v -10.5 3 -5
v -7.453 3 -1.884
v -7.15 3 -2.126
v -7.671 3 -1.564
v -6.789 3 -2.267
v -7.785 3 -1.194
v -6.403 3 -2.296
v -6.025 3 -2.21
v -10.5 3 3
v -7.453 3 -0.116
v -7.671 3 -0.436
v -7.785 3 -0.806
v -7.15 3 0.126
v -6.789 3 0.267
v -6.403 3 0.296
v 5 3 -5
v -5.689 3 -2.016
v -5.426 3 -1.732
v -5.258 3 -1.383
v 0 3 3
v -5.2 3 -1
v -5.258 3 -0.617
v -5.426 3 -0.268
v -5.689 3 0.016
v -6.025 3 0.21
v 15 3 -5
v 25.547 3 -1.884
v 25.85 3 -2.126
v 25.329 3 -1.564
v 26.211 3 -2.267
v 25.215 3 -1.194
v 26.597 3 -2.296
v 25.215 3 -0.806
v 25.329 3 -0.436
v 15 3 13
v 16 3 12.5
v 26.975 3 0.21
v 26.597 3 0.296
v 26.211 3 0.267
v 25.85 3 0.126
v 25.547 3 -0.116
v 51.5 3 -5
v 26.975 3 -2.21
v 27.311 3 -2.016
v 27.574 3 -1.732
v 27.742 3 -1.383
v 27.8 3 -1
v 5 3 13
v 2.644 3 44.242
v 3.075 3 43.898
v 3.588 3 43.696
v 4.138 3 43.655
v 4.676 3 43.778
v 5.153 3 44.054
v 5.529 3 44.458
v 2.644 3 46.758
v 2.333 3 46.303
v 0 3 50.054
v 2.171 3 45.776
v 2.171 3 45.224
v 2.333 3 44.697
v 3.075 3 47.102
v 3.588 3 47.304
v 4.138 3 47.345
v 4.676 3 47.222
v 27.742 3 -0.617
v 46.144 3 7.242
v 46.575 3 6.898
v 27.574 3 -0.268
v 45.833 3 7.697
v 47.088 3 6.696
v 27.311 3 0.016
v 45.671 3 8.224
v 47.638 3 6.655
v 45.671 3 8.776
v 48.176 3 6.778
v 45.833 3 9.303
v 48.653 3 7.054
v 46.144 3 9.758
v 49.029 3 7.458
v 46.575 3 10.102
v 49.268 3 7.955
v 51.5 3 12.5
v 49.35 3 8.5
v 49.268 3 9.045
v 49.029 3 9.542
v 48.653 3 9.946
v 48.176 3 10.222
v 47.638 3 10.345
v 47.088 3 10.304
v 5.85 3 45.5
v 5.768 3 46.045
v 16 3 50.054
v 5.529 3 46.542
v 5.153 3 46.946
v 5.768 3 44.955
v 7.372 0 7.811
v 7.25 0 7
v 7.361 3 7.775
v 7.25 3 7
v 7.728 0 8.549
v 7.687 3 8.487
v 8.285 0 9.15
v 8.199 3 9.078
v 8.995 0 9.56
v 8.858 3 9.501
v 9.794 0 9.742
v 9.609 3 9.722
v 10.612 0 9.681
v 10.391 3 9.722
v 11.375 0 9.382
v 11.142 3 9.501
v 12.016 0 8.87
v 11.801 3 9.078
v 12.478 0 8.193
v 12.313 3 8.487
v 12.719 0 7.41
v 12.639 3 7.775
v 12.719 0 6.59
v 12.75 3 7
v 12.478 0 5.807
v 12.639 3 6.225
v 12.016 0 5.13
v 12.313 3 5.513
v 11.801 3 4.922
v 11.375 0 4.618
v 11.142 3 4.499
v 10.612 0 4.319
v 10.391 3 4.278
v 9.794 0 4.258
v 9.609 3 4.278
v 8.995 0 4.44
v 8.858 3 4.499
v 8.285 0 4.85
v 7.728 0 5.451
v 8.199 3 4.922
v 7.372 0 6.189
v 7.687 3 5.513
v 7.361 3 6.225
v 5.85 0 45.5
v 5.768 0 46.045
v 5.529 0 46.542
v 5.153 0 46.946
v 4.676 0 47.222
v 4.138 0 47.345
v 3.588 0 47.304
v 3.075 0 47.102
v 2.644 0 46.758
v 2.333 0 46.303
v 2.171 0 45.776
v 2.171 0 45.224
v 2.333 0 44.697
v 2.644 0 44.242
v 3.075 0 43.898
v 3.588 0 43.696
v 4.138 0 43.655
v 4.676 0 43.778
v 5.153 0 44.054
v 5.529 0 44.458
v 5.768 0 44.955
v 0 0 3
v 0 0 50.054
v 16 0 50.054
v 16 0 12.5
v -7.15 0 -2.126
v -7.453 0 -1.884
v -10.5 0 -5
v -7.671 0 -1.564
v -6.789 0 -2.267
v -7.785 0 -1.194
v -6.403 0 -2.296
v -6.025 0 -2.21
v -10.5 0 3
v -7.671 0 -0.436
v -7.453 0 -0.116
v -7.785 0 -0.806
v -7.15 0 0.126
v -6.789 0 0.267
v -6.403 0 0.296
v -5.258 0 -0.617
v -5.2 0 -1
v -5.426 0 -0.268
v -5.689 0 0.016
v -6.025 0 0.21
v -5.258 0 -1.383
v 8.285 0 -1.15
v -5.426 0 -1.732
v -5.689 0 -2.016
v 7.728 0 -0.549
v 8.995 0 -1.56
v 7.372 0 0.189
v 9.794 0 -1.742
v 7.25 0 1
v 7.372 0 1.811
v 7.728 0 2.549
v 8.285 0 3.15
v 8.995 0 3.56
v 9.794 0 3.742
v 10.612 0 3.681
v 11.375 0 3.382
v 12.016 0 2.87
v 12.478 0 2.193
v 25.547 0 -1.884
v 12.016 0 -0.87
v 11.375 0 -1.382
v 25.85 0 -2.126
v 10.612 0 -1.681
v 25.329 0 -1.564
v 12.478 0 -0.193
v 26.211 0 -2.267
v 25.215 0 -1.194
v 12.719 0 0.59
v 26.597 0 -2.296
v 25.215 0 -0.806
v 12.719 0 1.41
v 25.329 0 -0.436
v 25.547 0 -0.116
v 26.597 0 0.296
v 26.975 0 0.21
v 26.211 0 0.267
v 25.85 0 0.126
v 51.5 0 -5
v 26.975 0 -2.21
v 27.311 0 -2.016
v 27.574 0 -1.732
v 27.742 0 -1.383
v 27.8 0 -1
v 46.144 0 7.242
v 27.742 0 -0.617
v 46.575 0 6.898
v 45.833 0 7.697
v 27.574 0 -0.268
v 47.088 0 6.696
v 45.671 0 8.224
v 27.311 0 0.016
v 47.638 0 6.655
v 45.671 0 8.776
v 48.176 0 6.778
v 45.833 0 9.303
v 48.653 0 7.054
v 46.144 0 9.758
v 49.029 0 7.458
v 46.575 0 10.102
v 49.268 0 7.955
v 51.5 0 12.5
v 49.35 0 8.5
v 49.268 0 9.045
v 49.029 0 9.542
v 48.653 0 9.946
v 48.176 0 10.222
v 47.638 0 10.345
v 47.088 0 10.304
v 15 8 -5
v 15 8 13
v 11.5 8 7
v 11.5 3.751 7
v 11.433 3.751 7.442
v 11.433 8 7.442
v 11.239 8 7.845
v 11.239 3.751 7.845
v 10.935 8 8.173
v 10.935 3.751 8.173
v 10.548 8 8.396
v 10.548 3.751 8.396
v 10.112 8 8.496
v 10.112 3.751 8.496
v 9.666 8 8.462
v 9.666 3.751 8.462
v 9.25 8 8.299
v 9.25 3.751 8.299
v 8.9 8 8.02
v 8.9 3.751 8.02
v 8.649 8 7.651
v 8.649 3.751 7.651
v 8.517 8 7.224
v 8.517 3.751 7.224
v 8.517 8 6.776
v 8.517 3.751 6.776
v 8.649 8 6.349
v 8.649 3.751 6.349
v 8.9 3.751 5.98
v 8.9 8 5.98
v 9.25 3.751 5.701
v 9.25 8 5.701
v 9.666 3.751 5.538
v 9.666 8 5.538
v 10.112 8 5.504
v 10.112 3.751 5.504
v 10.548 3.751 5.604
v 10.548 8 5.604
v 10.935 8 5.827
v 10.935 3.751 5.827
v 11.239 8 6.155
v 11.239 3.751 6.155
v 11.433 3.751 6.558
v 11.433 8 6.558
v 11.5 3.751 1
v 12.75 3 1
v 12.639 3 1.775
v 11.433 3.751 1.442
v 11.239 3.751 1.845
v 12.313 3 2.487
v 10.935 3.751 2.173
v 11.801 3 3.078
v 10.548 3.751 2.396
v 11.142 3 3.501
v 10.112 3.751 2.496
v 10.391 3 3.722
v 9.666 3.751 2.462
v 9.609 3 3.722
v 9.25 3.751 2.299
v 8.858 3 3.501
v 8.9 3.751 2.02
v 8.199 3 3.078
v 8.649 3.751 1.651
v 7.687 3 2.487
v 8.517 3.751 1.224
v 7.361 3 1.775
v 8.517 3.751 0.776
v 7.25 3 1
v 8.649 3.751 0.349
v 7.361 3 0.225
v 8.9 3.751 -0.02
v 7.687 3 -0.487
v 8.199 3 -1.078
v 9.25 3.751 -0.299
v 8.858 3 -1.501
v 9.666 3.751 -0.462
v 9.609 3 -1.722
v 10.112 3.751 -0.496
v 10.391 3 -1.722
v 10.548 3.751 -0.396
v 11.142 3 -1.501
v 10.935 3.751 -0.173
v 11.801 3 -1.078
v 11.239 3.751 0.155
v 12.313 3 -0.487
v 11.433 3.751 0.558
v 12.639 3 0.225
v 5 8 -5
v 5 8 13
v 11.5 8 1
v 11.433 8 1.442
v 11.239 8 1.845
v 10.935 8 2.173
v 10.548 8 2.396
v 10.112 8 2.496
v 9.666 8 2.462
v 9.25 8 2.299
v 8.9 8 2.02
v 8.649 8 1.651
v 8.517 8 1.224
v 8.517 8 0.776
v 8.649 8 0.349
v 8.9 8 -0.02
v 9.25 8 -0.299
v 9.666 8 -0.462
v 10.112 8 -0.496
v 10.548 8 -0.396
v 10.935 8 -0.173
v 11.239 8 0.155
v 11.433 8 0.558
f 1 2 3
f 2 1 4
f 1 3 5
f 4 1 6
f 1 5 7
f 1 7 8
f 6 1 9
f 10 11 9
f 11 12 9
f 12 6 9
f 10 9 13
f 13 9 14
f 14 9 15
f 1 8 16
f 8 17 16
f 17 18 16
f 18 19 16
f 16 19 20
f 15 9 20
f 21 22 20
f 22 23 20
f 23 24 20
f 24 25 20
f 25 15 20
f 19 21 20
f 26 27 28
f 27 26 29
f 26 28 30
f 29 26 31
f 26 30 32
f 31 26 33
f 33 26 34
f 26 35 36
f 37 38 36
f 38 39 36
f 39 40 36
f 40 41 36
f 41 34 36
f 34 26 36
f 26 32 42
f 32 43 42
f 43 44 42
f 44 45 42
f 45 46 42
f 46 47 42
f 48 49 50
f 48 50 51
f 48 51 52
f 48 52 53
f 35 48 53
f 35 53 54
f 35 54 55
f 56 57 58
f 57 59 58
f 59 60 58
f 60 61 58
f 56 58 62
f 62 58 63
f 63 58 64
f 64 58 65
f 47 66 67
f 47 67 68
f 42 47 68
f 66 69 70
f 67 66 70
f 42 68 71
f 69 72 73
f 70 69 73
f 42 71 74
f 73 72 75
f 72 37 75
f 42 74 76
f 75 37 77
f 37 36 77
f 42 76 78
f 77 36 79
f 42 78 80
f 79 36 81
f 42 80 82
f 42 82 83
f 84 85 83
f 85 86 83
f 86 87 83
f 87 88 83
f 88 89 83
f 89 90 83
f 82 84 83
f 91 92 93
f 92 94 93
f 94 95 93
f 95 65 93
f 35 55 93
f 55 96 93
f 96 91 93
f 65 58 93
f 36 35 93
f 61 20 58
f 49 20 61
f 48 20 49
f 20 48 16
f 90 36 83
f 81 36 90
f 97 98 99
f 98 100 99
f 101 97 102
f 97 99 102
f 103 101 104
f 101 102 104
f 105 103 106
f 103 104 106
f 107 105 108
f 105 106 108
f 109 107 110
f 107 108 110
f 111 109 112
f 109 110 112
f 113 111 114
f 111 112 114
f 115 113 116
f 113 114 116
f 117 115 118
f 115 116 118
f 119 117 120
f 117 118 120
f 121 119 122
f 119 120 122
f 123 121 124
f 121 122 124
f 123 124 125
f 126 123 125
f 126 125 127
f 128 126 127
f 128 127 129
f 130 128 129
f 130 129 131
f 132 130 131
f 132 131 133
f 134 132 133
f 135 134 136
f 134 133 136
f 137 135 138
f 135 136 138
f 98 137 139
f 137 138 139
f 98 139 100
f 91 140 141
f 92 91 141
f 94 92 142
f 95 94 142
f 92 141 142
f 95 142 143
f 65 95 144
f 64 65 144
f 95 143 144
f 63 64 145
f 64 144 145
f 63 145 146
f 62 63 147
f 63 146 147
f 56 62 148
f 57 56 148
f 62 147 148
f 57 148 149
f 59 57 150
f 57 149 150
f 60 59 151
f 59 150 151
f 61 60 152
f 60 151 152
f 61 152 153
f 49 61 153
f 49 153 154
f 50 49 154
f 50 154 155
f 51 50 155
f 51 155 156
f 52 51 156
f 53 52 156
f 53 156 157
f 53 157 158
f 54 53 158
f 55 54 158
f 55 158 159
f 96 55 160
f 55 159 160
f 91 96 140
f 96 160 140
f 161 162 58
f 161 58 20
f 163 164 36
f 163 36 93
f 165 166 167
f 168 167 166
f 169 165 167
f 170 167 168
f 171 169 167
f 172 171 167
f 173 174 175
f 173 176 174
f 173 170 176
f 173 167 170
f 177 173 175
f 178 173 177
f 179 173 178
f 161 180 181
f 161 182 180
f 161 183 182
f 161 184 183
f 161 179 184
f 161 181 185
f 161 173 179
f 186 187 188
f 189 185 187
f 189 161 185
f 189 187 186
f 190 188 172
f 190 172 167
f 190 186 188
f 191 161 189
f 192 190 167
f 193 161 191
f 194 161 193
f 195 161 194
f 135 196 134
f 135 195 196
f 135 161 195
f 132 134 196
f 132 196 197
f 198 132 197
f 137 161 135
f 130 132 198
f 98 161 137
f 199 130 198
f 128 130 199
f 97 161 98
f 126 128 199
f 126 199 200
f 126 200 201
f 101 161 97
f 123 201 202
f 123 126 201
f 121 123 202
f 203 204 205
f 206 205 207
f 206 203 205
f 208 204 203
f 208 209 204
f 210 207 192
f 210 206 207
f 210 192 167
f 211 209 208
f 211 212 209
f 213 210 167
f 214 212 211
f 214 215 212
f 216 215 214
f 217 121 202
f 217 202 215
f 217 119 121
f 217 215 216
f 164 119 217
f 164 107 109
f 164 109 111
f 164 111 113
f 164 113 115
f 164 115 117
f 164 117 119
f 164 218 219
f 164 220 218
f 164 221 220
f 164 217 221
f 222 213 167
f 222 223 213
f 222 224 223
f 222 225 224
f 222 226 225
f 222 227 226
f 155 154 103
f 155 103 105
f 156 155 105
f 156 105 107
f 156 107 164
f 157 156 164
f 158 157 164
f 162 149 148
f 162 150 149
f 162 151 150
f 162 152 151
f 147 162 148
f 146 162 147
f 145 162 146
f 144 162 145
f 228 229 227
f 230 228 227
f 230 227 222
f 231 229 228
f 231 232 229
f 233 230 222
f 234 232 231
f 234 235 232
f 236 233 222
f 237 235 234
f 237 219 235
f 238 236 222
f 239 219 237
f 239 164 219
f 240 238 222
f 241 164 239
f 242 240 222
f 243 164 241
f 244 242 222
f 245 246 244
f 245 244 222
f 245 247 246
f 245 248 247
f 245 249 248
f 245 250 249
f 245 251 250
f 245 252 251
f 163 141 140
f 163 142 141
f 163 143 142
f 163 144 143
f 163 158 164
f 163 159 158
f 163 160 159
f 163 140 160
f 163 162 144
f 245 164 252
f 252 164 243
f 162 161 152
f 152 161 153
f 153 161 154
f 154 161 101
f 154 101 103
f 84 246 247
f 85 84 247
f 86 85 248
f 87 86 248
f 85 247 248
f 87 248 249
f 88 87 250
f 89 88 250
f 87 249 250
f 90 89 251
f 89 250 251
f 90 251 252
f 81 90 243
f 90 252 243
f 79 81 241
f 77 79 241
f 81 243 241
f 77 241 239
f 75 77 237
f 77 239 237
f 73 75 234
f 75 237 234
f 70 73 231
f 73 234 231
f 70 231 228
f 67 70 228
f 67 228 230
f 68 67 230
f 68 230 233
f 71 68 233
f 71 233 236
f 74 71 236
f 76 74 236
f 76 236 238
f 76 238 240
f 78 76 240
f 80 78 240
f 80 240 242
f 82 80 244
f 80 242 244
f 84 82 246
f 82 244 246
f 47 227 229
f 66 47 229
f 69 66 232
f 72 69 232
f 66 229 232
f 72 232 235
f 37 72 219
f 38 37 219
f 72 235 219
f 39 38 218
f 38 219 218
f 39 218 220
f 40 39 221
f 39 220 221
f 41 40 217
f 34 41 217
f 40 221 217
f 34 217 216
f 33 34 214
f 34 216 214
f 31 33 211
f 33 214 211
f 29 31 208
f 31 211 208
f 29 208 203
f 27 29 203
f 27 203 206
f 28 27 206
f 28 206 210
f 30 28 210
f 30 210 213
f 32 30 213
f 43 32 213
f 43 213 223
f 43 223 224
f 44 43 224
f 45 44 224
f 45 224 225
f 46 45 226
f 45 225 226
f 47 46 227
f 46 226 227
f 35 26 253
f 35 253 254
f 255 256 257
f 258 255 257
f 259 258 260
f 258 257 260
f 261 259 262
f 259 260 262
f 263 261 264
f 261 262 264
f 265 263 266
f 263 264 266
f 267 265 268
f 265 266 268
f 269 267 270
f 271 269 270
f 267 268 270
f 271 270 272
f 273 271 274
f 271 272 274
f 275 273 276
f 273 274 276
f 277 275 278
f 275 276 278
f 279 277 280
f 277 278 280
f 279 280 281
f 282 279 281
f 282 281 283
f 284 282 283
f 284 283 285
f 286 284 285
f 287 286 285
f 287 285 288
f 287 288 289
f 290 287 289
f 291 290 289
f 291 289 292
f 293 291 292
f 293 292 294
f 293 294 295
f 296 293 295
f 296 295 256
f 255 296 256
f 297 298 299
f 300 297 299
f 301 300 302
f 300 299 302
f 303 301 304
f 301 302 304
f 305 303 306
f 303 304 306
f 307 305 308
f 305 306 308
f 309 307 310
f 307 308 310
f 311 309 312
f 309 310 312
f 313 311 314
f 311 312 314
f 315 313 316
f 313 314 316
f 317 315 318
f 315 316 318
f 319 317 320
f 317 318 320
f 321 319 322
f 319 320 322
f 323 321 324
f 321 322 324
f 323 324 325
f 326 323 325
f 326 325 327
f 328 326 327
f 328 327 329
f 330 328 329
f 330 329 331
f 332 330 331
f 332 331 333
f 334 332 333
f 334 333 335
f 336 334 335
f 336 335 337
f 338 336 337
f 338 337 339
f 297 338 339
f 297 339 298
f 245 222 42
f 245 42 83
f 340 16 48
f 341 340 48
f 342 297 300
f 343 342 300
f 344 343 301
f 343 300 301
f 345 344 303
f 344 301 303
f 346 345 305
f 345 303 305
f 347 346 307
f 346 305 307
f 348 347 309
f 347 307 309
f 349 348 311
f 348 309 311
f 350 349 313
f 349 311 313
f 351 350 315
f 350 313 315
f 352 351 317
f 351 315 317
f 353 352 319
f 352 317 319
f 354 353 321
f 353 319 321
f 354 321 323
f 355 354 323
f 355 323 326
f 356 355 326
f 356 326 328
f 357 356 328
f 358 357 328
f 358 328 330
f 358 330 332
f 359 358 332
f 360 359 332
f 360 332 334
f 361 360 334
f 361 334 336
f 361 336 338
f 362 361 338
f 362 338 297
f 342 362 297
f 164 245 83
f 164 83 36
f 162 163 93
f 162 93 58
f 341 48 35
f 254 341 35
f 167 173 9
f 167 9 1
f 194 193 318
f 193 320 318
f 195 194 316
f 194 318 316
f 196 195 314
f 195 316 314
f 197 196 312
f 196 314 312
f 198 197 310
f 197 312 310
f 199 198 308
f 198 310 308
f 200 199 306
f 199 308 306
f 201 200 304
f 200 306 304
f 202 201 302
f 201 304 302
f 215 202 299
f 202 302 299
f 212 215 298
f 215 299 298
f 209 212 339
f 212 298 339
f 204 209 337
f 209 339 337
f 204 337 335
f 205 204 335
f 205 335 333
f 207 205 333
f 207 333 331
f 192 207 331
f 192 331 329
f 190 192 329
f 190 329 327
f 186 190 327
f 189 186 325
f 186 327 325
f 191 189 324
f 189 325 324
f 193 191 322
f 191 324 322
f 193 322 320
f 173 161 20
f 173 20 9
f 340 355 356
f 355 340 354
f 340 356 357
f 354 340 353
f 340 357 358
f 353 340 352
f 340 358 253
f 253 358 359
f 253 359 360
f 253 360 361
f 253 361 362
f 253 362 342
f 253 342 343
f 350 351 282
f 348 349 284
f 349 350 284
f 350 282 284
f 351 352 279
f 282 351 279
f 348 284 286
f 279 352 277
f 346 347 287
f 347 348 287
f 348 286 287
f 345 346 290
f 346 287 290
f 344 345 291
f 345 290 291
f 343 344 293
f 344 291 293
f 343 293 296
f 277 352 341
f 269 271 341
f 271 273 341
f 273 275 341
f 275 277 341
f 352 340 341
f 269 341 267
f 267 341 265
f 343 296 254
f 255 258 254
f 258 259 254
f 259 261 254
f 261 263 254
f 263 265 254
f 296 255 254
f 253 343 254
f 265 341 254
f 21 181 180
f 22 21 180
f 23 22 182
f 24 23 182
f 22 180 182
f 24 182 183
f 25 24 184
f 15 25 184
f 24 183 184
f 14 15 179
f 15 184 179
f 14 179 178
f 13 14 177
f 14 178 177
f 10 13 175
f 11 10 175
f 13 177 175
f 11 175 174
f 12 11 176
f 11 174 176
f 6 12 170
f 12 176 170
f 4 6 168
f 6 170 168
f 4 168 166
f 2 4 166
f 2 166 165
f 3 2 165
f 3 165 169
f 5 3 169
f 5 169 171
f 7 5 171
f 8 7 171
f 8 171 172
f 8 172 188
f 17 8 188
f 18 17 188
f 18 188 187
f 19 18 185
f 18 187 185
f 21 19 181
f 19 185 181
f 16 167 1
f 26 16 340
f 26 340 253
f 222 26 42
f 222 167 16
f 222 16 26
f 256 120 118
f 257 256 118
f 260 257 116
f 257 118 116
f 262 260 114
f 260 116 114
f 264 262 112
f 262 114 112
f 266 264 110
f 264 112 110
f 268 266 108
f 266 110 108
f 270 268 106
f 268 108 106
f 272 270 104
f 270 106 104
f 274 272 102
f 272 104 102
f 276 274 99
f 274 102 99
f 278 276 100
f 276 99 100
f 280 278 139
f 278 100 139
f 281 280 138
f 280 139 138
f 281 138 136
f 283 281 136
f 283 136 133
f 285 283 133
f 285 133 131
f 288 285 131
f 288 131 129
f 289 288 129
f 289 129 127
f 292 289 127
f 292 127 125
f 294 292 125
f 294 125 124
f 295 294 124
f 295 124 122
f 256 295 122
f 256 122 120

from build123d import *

# Parameters (mm, degrees)
F0_R     = 1.3
F0_R_2   = 1.85
F0_W     = 10
F0_H     = 18
F0_R_3   = 1.5
F1_DEPTH = 3
F2_DEPTH = 8
F3_D     = 5.5
F3_DEPTH = 3
F3_TIP   = 1.6523667023


with BuildPart() as f1:
    # F0 (on Front) → F1 (new body)
    with BuildSketch(Plane.XZ):
        Polygon((0, 3), (-10.5, 3), (-10.5, -5), (5, -5), (5, 13), (15, 13), (15, -5), (51.5, -5), (51.5, 12.5), (16, 12.5), (16, 50.0543485135), (0, 50.0543485135), align=None)
        with Locations((-6.5, -1)):
            Circle(F0_R, mode=Mode.SUBTRACT)
        with Locations((26.5, -1)):
            Circle(F0_R, mode=Mode.SUBTRACT)
        with Locations((47.5, 8.5)):
            Circle(F0_R_2, mode=Mode.SUBTRACT)
        with Locations((4, 45.5)):
            Circle(F0_R_2, mode=Mode.SUBTRACT)
        with Locations((10, 4)):
            Rectangle(F0_W, F0_H)
        with Locations((10, 1)):
            Circle(F0_R_3, mode=Mode.SUBTRACT)
        with Locations((10, 7)):
            Circle(F0_R_3, mode=Mode.SUBTRACT)
    extrude(amount=-F1_DEPTH)

    # F0 (on Front) → F2 (join)
    with BuildSketch(Plane.XZ):
        with Locations((10, 4)):
            Rectangle(F0_W, F0_H)
        with Locations((10, 1)):
            Circle(F0_R_3, mode=Mode.SUBTRACT)
        with Locations((10, 7)):
            Circle(F0_R_3, mode=Mode.SUBTRACT)
    extrude(amount=-F2_DEPTH)

    # F3
    with Locations(Plane.XZ):
        with Locations((10, 7), (10, 1)):
            Hole(F3_D / 2, depth=F3_DEPTH)
            with Locations((0, 0, -(F3_DEPTH + F3_TIP / 2))):  # 118° drill point
                Cone(0, F3_D / 2, F3_TIP, mode=Mode.SUBTRACT)


solid = f1.part
